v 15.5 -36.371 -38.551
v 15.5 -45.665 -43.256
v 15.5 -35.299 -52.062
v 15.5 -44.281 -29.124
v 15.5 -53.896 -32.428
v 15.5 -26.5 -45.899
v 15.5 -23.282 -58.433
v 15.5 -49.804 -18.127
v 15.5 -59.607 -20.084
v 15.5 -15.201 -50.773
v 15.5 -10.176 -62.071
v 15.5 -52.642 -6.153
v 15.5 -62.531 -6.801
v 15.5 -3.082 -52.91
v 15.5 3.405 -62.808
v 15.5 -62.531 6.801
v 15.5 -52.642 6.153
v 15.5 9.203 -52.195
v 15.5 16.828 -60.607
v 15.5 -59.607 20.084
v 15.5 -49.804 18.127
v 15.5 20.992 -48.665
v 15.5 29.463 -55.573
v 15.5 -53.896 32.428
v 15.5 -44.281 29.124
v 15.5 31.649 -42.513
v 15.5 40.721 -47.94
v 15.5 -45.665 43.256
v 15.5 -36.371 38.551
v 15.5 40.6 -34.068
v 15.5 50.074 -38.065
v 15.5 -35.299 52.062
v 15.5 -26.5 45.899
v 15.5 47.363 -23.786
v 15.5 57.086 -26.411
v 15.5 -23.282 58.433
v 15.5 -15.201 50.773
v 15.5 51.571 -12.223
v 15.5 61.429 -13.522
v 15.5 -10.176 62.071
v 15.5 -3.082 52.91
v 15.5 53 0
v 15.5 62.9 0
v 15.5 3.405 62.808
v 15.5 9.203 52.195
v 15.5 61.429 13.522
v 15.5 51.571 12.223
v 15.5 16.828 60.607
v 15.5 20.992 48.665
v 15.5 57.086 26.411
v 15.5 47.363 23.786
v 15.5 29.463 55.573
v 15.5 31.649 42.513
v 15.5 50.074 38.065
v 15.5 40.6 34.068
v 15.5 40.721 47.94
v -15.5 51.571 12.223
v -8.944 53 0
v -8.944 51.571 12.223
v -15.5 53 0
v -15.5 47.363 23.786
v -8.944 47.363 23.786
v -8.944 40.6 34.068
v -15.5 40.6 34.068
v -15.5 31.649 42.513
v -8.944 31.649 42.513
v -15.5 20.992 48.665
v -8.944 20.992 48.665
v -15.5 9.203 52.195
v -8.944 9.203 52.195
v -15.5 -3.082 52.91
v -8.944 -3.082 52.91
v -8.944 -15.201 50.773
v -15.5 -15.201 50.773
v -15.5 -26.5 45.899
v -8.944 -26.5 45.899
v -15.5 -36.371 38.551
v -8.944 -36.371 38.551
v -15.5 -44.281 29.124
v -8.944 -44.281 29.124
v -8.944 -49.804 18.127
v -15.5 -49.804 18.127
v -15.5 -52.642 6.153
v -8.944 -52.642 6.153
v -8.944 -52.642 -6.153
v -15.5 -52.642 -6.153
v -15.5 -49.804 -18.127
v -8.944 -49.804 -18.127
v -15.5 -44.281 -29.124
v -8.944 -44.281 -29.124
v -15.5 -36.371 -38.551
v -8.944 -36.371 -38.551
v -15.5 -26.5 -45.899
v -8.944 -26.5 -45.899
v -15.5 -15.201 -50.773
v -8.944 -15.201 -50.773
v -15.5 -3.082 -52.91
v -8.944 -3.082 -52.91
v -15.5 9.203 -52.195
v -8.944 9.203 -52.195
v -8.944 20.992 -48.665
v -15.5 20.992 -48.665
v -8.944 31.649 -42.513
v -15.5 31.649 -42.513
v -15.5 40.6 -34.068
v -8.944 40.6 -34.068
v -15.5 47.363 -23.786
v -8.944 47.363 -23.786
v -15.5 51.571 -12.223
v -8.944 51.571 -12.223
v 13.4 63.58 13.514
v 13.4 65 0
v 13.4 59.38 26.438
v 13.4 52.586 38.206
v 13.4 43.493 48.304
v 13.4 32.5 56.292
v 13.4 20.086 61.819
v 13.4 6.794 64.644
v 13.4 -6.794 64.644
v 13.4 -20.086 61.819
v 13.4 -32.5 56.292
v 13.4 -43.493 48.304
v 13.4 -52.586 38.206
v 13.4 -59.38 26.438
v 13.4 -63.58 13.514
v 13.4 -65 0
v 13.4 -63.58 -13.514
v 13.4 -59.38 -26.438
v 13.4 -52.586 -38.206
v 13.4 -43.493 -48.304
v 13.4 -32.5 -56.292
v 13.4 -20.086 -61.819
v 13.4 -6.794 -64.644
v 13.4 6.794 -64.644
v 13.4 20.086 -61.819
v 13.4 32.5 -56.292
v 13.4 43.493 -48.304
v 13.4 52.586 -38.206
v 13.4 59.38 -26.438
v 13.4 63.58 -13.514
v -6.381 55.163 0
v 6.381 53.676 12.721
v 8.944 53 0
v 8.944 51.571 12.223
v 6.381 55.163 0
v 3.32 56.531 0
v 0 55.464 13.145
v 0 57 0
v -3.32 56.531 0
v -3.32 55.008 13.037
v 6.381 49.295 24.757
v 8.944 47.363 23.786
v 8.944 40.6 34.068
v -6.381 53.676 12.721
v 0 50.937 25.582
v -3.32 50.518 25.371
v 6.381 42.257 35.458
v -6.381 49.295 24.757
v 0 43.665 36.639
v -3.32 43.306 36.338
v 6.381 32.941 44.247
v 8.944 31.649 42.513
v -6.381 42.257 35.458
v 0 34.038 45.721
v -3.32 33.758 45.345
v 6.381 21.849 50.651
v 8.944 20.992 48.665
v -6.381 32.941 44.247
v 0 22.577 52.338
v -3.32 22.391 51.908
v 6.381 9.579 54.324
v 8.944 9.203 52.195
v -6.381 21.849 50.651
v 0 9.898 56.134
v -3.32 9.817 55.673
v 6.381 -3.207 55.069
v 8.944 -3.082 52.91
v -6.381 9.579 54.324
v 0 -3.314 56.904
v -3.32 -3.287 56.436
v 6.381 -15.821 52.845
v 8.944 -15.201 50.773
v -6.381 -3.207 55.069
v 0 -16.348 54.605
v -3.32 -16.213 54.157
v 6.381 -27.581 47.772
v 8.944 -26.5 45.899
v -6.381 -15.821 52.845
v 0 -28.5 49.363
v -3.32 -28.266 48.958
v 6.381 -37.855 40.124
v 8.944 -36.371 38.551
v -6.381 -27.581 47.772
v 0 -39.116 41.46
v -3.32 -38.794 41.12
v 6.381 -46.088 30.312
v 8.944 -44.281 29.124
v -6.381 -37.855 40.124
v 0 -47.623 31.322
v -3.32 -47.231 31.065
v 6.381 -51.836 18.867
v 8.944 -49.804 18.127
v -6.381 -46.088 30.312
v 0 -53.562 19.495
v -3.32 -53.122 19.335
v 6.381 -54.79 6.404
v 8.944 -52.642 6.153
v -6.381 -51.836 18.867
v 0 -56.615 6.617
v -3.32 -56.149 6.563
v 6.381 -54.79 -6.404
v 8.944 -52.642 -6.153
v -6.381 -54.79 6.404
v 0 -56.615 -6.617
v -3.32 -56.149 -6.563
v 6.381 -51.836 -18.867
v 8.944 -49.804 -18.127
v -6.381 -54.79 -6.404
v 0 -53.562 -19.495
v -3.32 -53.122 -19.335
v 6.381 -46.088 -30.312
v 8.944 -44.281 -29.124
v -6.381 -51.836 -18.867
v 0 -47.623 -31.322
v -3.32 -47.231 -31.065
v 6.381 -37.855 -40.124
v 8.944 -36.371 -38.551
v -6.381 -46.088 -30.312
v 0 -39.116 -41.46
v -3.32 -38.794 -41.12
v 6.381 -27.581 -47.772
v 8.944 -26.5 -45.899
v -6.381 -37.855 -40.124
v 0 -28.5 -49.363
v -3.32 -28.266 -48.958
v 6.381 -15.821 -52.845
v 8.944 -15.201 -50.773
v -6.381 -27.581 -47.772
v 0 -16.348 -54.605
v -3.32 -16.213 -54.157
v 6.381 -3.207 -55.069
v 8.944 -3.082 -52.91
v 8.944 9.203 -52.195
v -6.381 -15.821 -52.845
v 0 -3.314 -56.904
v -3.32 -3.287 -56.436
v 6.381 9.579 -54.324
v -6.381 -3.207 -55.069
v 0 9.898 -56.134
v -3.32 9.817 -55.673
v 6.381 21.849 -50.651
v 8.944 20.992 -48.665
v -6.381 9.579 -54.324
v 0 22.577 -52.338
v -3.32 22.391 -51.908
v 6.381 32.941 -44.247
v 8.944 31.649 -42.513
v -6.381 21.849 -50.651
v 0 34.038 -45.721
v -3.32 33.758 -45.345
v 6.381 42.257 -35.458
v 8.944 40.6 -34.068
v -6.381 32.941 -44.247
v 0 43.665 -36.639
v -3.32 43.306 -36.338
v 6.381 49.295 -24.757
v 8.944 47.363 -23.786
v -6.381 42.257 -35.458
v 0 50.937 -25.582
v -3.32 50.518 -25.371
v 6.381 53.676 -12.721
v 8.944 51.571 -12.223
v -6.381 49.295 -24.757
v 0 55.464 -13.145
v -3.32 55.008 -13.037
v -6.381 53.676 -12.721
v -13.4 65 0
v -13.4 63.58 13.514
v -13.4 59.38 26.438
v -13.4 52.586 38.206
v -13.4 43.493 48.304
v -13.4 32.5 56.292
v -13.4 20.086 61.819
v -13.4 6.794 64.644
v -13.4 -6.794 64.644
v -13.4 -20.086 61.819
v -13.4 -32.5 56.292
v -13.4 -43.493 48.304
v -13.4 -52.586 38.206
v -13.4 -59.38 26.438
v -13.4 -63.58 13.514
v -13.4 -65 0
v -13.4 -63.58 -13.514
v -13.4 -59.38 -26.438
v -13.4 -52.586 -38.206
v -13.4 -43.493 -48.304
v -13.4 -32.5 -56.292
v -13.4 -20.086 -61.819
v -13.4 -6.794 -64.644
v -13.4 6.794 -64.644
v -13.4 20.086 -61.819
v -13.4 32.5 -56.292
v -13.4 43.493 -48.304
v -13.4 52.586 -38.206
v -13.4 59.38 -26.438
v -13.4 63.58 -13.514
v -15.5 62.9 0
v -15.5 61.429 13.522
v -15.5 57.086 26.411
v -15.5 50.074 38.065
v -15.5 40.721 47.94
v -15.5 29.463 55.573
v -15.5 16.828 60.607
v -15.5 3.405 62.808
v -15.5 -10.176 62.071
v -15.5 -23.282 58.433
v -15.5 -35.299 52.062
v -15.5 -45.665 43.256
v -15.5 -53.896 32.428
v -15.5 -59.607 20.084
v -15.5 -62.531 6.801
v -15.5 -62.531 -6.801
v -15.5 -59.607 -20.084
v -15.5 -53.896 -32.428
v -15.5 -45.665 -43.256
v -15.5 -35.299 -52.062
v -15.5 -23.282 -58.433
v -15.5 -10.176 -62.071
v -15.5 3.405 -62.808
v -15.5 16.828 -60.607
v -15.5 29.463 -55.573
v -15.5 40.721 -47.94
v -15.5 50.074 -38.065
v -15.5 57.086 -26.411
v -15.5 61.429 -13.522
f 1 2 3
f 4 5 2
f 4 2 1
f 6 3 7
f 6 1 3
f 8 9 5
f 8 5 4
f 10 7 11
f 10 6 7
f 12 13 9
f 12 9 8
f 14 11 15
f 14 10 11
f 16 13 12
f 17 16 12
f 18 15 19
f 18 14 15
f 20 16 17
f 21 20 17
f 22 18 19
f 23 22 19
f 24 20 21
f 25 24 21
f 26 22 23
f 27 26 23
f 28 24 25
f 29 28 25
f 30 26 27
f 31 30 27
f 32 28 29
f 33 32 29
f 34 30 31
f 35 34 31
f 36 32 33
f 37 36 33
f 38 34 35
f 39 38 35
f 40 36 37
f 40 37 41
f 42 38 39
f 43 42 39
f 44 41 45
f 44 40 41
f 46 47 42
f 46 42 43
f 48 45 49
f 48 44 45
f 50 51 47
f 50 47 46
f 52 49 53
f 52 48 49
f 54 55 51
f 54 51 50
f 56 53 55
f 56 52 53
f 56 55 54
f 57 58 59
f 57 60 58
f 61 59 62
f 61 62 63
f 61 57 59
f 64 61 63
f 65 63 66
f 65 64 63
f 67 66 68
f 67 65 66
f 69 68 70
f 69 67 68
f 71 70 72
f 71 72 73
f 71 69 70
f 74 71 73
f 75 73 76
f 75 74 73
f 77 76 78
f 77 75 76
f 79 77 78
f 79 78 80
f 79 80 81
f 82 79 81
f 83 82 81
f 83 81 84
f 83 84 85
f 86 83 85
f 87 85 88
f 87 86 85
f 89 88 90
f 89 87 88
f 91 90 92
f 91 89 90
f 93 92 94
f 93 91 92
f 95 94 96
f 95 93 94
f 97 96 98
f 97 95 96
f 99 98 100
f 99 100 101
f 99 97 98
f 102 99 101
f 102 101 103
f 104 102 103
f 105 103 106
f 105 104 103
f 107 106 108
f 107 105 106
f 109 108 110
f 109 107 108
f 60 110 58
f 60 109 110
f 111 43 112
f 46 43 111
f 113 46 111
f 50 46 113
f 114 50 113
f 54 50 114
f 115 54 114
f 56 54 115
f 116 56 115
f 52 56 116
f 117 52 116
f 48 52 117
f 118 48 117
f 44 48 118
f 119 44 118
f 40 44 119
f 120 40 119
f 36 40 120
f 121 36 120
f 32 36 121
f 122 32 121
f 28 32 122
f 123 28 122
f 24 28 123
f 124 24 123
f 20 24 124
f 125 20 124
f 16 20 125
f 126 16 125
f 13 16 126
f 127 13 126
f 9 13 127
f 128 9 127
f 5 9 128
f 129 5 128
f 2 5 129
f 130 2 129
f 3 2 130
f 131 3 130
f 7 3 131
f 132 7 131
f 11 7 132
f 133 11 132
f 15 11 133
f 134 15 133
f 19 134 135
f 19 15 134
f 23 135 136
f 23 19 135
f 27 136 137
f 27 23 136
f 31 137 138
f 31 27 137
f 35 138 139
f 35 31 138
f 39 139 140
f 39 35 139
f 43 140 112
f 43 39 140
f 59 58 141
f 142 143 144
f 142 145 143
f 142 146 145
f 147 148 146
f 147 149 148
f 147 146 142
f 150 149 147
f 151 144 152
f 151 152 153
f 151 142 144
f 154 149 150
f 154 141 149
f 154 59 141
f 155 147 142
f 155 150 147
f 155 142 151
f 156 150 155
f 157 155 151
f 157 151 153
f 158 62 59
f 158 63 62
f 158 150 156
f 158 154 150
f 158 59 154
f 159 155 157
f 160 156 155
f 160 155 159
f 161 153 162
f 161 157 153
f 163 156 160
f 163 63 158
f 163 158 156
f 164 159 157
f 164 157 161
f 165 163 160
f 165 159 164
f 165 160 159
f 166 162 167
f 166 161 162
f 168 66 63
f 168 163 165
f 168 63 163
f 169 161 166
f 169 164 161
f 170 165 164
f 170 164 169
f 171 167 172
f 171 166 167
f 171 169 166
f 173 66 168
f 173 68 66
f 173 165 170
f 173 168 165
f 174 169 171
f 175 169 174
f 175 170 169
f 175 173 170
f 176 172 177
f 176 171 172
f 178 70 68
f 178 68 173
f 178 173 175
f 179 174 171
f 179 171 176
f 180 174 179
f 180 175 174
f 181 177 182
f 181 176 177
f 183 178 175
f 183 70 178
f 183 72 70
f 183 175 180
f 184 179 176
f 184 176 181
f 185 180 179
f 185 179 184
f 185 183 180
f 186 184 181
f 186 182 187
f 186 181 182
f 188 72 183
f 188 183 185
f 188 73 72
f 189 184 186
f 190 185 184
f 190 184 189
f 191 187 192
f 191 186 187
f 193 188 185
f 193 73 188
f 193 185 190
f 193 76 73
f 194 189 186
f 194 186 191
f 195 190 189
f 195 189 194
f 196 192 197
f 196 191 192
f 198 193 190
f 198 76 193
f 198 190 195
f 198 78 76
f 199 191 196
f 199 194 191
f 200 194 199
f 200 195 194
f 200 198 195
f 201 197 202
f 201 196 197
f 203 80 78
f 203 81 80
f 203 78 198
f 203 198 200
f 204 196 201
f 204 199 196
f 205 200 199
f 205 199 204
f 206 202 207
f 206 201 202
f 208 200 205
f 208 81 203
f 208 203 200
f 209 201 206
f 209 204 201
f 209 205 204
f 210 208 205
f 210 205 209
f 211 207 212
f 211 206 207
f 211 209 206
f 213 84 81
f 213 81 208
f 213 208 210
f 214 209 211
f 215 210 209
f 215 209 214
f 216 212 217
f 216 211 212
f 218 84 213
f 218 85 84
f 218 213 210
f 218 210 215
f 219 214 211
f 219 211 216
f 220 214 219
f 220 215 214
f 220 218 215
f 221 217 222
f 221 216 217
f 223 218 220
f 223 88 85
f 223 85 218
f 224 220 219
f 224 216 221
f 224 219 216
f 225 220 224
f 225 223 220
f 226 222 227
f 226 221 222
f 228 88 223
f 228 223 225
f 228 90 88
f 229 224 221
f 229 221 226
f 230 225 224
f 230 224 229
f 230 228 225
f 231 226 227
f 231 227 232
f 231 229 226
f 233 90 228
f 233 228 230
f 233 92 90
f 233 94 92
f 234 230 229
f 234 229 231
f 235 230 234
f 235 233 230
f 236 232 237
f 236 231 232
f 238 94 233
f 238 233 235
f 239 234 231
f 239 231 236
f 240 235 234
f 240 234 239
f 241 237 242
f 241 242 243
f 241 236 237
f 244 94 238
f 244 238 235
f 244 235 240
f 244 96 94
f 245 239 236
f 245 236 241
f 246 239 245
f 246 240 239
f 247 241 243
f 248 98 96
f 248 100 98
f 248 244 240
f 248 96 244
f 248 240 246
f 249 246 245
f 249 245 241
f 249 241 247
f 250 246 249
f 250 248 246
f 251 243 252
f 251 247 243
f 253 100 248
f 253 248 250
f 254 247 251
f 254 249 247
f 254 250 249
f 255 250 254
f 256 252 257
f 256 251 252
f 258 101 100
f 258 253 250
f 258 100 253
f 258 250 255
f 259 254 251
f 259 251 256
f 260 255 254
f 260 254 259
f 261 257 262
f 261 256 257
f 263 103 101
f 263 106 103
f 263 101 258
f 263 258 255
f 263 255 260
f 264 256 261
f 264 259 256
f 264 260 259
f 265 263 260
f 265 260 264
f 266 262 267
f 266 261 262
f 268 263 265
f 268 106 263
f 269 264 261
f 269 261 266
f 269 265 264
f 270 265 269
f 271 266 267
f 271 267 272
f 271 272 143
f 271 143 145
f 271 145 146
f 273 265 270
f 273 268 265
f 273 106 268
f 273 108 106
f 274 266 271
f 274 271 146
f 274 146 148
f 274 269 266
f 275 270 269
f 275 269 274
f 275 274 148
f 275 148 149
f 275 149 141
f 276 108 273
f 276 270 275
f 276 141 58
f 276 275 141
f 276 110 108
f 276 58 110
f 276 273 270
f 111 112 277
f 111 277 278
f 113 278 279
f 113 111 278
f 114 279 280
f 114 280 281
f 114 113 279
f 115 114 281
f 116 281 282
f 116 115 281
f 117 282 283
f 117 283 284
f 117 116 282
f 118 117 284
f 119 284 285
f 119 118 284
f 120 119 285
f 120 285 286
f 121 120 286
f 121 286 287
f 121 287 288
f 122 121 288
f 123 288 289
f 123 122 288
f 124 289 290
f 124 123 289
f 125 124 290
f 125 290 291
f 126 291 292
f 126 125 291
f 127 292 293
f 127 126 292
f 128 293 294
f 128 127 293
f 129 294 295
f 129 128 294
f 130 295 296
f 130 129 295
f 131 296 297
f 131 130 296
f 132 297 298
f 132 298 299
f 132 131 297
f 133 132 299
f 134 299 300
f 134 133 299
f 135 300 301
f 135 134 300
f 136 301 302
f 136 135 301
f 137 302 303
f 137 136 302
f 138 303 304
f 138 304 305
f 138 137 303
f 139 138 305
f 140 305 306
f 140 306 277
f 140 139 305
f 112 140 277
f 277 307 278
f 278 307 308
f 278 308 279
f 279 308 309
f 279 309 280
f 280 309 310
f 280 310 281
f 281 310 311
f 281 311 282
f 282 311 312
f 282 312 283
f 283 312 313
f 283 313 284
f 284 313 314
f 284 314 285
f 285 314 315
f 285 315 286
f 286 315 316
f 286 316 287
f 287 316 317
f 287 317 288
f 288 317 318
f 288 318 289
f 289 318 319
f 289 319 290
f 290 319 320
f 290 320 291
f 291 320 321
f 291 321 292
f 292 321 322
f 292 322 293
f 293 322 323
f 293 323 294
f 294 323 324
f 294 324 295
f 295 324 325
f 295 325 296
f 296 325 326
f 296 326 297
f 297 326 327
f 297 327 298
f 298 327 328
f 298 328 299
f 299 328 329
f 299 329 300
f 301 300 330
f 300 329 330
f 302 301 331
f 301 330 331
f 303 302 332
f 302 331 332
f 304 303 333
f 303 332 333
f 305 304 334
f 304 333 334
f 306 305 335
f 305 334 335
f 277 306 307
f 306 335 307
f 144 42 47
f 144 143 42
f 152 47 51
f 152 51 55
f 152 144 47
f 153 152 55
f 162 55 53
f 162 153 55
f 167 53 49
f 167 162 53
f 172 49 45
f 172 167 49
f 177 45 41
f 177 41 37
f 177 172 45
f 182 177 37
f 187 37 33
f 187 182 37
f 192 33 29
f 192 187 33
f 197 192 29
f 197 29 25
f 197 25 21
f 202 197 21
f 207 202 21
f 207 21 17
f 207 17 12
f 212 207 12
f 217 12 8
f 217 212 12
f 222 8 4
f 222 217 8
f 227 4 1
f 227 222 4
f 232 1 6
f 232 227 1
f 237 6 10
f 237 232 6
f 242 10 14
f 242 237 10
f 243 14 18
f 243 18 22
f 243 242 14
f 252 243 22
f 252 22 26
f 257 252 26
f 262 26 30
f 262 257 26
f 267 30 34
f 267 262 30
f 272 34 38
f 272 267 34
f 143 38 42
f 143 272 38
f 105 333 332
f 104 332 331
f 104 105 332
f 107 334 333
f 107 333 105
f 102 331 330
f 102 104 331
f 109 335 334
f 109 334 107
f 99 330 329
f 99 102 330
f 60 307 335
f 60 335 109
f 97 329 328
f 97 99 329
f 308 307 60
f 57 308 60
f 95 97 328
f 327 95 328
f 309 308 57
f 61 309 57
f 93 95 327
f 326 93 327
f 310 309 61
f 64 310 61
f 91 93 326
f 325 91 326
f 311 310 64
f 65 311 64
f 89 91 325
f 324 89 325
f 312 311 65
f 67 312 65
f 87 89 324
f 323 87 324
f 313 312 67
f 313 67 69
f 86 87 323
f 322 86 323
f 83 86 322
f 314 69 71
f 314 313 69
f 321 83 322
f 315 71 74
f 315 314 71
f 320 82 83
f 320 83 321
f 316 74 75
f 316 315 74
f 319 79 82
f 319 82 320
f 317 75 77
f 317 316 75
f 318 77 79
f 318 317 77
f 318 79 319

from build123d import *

# Parameters (mm, degrees)
CHAMFER1_SIZE = 2.1


with BuildPart() as part:
    # Sketch1 → Revolve1 (revolve)
    with BuildSketch(Plane.XY):
        with BuildLine():
            Line((-15.5, 65), (15.5, 65))
            Line((15.5, 65), (15.5, 53))
            Line((15.5, 53), (8.94427191, 53))
            ThreePointArc((8.94427191, 53), (0, 57), (-8.94427191, 53))
            Line((-8.94427191, 53), (-15.5, 53))
            Line((-15.5, 53), (-15.5, 65))
        make_face()
    revolve(axis=Axis((-47.365464456, 0, 0), (1, 0, 0)))

    # Chamfer1
    chamfer1_edges = [part.edges().sort_by_distance(p)[0] for p in [
        (15.5, -65, 0),
        (-15.5, -65, 0),
    ]]
    chamfer(chamfer1_edges, length=CHAMFER1_SIZE)


solid = part.part
